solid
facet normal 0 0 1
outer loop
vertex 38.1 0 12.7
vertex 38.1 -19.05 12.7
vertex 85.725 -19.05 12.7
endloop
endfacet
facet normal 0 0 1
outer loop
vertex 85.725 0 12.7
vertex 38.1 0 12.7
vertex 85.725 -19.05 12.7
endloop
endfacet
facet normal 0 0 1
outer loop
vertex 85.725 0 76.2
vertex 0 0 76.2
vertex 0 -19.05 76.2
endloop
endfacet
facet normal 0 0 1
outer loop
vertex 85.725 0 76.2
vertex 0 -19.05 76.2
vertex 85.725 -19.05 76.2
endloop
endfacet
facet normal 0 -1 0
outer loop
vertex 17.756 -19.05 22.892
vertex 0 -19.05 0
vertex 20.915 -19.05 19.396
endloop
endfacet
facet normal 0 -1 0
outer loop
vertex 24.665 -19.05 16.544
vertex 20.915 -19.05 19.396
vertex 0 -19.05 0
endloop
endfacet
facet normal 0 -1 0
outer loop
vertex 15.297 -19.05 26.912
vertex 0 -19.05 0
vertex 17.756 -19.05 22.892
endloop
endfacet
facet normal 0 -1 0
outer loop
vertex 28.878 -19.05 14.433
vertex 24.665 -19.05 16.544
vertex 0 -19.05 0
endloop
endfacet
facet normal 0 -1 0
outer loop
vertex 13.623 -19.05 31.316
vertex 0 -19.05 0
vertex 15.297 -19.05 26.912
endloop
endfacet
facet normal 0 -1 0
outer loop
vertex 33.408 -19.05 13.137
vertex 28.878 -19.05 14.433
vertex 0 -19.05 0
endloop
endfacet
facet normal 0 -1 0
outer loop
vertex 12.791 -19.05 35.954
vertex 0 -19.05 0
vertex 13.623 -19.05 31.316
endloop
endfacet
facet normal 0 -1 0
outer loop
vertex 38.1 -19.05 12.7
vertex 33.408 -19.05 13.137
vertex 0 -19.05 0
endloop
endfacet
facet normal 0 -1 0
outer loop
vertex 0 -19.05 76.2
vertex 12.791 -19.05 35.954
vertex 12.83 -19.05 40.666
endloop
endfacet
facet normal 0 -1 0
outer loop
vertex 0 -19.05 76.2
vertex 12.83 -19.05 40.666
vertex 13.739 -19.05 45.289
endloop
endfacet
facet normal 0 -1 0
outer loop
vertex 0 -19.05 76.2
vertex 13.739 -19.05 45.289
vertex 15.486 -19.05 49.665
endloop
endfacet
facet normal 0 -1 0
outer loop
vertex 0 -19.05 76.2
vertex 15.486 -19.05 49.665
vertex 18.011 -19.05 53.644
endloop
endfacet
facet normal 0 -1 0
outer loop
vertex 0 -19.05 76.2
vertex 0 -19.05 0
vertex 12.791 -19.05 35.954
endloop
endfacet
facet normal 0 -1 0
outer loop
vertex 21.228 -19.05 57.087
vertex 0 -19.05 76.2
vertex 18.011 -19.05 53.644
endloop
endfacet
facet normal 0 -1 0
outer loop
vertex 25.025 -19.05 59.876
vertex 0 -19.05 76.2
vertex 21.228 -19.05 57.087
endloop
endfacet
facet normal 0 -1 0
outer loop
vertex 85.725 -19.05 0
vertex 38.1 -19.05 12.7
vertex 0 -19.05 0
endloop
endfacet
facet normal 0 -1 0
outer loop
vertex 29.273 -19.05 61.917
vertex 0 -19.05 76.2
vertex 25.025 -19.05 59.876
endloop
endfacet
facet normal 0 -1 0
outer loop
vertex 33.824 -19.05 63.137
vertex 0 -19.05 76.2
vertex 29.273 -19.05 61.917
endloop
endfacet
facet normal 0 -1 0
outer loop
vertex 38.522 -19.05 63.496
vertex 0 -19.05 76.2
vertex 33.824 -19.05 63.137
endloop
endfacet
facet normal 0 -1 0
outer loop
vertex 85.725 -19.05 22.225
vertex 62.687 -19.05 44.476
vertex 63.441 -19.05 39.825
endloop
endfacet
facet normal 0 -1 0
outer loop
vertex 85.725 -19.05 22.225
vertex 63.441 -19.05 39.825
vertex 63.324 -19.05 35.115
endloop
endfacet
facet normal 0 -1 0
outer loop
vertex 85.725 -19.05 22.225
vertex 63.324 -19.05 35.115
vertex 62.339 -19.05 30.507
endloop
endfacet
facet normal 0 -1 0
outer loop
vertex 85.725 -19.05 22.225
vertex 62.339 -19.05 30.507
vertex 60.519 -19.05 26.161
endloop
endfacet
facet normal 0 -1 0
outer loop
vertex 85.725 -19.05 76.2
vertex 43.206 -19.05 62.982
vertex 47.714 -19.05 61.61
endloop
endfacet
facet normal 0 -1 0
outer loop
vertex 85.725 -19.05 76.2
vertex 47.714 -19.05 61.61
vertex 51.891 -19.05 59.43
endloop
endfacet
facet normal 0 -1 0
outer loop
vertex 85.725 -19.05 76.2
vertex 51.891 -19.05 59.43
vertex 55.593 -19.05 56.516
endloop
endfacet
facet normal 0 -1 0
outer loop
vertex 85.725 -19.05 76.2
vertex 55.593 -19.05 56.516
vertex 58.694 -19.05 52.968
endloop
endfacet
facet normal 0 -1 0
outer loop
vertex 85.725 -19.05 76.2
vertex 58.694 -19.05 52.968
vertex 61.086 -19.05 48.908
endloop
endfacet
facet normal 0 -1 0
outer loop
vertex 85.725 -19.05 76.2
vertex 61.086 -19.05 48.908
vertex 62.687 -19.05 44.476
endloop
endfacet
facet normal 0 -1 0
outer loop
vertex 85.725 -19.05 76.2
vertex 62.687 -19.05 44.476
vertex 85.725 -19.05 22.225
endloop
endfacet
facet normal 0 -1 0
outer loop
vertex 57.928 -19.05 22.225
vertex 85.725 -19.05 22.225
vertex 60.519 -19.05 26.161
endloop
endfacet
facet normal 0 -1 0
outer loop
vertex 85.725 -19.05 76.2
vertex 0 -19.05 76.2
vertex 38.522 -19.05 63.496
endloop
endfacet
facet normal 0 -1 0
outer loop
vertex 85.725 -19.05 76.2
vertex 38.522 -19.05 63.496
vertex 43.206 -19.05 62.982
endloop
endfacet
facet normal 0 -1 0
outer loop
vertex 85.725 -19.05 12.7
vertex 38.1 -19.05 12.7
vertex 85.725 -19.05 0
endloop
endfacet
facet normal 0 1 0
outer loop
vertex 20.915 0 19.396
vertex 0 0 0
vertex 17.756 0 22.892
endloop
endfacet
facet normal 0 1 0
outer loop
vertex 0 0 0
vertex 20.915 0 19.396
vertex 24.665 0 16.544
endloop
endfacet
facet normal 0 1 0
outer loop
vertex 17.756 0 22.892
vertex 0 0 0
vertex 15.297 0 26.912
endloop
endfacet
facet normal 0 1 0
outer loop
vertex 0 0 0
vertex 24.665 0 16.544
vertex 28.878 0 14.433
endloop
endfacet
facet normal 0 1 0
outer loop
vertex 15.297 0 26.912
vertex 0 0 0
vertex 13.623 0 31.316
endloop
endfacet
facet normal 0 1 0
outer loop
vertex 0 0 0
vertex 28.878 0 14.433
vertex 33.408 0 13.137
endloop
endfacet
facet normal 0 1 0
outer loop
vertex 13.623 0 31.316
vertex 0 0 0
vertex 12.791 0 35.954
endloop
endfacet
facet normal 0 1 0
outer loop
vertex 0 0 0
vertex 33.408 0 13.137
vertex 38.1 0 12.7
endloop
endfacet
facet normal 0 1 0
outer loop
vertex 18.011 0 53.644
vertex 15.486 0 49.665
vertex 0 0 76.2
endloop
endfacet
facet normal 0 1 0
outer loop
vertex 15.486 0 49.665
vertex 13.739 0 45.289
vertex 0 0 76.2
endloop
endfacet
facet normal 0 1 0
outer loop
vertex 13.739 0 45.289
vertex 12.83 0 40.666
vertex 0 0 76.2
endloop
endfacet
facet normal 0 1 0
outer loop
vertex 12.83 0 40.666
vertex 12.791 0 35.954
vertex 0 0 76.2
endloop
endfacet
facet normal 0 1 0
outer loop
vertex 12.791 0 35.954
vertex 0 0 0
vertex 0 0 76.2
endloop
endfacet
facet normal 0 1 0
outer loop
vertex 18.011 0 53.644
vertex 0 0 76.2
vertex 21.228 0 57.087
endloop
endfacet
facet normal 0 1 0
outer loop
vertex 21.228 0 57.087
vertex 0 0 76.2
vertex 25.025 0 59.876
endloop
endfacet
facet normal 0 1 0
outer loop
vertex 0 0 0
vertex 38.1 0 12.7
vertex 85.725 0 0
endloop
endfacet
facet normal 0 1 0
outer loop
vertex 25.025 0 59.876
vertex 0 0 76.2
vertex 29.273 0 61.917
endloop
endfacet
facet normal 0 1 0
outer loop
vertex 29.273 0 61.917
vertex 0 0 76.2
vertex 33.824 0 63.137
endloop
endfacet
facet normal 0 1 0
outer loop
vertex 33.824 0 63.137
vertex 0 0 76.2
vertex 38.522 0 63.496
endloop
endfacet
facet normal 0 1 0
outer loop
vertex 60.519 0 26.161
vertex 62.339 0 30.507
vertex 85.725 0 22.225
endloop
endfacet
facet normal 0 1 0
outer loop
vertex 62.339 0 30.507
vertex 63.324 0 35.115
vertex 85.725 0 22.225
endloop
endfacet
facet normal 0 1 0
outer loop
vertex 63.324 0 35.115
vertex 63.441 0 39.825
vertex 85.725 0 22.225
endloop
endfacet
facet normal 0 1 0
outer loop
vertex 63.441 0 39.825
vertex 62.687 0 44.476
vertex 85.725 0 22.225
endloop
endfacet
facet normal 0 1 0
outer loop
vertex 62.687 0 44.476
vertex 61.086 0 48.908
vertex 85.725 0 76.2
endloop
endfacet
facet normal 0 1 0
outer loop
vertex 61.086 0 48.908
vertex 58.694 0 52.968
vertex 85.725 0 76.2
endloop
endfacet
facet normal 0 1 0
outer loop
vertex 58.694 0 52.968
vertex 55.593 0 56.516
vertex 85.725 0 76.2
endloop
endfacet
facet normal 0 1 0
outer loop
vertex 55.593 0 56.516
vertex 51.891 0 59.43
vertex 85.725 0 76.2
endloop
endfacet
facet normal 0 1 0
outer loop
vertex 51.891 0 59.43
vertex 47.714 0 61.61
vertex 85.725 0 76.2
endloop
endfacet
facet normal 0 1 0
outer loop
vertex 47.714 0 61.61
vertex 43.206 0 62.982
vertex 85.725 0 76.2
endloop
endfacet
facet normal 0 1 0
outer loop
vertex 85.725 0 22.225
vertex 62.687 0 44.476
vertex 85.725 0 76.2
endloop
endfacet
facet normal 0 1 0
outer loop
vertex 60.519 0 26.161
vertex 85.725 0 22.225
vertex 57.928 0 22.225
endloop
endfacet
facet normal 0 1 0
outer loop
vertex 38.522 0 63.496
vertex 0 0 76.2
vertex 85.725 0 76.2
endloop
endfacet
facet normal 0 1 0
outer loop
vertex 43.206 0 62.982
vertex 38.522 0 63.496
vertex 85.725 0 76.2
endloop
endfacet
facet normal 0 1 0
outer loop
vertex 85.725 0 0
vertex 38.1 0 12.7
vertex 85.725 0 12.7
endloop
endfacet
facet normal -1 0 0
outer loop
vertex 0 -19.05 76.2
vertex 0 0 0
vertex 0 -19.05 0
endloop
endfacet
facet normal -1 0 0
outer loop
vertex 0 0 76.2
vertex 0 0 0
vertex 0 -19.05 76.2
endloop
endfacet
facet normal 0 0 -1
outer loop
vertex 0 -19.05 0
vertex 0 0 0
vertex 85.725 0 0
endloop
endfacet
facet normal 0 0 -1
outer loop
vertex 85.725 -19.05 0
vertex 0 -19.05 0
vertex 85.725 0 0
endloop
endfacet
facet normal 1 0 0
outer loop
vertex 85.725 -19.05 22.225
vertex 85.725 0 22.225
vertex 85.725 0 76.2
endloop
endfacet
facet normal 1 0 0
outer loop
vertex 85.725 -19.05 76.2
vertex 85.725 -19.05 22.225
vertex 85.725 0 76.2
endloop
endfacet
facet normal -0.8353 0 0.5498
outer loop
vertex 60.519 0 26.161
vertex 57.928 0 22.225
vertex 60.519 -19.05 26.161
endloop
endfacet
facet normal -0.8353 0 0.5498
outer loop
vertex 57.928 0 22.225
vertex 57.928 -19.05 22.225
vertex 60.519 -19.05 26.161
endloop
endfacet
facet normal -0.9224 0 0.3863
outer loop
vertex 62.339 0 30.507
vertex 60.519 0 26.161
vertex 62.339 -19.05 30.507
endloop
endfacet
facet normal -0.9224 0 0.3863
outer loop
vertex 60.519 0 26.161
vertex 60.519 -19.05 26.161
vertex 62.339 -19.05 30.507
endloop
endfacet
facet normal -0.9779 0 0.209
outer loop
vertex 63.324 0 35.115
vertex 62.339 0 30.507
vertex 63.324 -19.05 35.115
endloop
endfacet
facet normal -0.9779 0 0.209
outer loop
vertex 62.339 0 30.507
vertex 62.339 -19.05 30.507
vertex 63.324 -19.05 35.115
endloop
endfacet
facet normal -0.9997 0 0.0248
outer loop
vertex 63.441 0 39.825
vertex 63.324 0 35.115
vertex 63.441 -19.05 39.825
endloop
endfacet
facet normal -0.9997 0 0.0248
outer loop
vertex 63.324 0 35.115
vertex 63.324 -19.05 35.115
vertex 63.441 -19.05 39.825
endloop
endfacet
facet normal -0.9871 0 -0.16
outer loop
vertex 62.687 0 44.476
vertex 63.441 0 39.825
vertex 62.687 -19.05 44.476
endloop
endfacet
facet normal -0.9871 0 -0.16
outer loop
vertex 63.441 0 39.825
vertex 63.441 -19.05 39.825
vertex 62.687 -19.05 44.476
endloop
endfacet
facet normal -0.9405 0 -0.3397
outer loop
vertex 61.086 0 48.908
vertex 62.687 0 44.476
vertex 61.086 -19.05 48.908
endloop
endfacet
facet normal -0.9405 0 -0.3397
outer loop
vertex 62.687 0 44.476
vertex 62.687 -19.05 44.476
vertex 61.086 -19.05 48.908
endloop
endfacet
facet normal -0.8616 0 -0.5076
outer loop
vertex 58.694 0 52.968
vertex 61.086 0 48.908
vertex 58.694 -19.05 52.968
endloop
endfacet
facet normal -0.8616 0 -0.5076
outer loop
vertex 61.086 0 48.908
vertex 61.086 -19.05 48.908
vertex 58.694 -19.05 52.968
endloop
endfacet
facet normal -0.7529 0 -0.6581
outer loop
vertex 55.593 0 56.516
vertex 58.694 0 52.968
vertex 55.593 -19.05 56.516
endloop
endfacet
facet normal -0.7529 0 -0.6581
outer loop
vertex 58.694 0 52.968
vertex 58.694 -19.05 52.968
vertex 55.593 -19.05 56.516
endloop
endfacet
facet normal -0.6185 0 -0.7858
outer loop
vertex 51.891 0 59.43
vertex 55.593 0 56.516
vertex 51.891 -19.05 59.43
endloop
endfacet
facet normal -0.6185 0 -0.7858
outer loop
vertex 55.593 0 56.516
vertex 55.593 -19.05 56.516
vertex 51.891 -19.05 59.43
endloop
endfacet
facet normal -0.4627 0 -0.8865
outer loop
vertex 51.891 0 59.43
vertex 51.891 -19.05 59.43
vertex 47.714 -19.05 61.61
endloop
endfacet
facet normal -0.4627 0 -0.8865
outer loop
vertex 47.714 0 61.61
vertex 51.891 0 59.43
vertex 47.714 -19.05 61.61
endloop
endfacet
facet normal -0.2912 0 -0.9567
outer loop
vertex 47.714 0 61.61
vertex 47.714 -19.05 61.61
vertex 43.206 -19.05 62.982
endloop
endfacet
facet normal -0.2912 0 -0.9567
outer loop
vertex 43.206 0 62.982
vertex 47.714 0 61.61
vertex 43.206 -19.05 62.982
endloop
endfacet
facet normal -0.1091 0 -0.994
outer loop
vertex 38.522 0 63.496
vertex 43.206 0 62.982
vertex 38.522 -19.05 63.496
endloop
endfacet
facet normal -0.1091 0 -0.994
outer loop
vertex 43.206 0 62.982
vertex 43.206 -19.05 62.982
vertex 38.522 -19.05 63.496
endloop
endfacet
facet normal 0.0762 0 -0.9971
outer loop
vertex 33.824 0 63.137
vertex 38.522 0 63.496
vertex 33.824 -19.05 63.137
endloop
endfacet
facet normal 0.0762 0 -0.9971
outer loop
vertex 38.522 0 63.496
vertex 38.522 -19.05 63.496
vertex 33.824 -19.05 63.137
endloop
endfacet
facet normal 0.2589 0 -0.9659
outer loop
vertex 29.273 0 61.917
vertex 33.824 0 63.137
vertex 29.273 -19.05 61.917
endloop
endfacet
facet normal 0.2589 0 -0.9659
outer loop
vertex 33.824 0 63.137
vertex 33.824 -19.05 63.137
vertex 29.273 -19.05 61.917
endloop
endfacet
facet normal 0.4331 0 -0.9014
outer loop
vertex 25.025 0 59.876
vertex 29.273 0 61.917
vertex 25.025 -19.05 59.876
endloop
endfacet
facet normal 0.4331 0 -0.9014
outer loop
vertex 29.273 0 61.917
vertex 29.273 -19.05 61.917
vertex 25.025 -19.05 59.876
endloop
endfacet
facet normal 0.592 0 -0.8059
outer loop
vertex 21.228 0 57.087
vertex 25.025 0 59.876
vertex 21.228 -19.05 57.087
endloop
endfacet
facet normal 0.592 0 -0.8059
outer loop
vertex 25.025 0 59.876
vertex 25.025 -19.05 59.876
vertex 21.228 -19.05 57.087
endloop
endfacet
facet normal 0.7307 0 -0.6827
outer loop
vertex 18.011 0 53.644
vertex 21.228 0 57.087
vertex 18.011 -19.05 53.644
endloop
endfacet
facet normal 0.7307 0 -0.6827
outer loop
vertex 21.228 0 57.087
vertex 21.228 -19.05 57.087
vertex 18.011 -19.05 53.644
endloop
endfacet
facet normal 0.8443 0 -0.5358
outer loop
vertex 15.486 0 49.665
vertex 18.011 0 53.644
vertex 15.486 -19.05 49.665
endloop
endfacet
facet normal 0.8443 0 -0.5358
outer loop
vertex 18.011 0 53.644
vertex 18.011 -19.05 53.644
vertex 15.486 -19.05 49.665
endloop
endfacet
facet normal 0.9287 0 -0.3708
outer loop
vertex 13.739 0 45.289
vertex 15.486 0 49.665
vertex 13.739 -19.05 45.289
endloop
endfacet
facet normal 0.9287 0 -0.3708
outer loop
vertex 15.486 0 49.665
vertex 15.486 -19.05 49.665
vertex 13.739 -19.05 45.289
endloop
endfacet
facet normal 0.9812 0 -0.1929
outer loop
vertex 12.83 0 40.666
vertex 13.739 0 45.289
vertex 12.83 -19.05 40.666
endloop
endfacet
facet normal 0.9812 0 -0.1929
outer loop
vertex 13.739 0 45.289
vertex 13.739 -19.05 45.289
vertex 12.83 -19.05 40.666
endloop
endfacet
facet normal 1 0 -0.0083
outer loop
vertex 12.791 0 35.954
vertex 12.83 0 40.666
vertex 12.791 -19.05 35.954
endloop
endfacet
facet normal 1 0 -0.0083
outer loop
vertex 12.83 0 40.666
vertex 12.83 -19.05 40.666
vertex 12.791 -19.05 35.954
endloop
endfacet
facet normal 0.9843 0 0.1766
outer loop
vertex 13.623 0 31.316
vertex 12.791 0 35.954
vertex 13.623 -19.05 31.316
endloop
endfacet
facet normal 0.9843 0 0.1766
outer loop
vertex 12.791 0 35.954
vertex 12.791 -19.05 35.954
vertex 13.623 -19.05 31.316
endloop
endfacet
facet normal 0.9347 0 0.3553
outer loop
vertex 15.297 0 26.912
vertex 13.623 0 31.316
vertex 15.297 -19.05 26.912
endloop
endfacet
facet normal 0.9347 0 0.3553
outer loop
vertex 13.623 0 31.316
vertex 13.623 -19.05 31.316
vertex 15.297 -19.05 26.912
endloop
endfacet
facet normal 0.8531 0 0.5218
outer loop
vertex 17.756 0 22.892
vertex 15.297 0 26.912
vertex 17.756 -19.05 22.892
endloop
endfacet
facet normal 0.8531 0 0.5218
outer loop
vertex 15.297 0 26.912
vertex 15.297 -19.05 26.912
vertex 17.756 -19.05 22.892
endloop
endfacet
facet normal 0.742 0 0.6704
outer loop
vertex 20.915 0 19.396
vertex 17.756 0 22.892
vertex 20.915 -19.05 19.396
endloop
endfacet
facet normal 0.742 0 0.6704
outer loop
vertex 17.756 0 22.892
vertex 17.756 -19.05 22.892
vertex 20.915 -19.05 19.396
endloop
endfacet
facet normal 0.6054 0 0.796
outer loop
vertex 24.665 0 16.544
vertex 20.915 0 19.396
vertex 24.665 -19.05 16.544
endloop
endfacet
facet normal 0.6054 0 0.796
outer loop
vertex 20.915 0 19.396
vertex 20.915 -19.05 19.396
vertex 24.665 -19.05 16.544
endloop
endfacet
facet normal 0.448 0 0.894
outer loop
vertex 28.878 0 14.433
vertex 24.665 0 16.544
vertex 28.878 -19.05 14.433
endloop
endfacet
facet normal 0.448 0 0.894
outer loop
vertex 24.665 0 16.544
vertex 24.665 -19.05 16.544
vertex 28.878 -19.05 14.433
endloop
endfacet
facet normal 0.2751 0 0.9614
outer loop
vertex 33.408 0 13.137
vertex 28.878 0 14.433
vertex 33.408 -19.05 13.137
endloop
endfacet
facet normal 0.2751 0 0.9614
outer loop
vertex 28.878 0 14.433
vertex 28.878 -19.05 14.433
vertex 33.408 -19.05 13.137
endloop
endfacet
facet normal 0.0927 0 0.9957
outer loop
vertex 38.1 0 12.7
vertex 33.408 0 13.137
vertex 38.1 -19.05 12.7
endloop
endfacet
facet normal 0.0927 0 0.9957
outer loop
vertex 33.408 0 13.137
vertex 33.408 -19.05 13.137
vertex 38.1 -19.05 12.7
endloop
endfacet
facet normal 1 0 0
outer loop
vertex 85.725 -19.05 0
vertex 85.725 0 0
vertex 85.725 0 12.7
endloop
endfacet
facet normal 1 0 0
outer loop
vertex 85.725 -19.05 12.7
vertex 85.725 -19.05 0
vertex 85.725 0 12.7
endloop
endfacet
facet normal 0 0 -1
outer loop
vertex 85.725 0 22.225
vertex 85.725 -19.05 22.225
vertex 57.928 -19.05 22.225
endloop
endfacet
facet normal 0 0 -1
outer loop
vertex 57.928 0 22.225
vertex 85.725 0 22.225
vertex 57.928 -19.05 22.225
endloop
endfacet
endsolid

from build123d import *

# Parameters (mm, degrees)
F0_W     = 85.725
F0_H     = 76.2
F1_DEPTH = 19.05
F2_R     = 25.4
F3_DEPTH = 25.4
F5_DEPTH = 25.4


with BuildPart() as f1:
    # F0 (on Front) → F1 (new body)
    with BuildSketch(Plane.XZ):
        with Locations((42.8625, 38.1)):
            Rectangle(F0_W, F0_H)
    extrude(amount=F1_DEPTH)

    # F2 (on face) → F3 (cut)
    with BuildSketch(Plane.XZ.offset(19.05)):
        with Locations((38.1, 38.1)):
            Circle(F2_R)
    extrude(amount=-F3_DEPTH, mode=Mode.SUBTRACT)

    # F4 (on face) → F5 (cut)
    with BuildSketch(Plane.XZ.offset(19.05)):
        Polygon((85.725, 12.7), (85.725, 22.225), (57.927869, 22.225), (38.1, 12.7), align=None)
    extrude(amount=-F5_DEPTH, mode=Mode.SUBTRACT)


solid = f1.part
